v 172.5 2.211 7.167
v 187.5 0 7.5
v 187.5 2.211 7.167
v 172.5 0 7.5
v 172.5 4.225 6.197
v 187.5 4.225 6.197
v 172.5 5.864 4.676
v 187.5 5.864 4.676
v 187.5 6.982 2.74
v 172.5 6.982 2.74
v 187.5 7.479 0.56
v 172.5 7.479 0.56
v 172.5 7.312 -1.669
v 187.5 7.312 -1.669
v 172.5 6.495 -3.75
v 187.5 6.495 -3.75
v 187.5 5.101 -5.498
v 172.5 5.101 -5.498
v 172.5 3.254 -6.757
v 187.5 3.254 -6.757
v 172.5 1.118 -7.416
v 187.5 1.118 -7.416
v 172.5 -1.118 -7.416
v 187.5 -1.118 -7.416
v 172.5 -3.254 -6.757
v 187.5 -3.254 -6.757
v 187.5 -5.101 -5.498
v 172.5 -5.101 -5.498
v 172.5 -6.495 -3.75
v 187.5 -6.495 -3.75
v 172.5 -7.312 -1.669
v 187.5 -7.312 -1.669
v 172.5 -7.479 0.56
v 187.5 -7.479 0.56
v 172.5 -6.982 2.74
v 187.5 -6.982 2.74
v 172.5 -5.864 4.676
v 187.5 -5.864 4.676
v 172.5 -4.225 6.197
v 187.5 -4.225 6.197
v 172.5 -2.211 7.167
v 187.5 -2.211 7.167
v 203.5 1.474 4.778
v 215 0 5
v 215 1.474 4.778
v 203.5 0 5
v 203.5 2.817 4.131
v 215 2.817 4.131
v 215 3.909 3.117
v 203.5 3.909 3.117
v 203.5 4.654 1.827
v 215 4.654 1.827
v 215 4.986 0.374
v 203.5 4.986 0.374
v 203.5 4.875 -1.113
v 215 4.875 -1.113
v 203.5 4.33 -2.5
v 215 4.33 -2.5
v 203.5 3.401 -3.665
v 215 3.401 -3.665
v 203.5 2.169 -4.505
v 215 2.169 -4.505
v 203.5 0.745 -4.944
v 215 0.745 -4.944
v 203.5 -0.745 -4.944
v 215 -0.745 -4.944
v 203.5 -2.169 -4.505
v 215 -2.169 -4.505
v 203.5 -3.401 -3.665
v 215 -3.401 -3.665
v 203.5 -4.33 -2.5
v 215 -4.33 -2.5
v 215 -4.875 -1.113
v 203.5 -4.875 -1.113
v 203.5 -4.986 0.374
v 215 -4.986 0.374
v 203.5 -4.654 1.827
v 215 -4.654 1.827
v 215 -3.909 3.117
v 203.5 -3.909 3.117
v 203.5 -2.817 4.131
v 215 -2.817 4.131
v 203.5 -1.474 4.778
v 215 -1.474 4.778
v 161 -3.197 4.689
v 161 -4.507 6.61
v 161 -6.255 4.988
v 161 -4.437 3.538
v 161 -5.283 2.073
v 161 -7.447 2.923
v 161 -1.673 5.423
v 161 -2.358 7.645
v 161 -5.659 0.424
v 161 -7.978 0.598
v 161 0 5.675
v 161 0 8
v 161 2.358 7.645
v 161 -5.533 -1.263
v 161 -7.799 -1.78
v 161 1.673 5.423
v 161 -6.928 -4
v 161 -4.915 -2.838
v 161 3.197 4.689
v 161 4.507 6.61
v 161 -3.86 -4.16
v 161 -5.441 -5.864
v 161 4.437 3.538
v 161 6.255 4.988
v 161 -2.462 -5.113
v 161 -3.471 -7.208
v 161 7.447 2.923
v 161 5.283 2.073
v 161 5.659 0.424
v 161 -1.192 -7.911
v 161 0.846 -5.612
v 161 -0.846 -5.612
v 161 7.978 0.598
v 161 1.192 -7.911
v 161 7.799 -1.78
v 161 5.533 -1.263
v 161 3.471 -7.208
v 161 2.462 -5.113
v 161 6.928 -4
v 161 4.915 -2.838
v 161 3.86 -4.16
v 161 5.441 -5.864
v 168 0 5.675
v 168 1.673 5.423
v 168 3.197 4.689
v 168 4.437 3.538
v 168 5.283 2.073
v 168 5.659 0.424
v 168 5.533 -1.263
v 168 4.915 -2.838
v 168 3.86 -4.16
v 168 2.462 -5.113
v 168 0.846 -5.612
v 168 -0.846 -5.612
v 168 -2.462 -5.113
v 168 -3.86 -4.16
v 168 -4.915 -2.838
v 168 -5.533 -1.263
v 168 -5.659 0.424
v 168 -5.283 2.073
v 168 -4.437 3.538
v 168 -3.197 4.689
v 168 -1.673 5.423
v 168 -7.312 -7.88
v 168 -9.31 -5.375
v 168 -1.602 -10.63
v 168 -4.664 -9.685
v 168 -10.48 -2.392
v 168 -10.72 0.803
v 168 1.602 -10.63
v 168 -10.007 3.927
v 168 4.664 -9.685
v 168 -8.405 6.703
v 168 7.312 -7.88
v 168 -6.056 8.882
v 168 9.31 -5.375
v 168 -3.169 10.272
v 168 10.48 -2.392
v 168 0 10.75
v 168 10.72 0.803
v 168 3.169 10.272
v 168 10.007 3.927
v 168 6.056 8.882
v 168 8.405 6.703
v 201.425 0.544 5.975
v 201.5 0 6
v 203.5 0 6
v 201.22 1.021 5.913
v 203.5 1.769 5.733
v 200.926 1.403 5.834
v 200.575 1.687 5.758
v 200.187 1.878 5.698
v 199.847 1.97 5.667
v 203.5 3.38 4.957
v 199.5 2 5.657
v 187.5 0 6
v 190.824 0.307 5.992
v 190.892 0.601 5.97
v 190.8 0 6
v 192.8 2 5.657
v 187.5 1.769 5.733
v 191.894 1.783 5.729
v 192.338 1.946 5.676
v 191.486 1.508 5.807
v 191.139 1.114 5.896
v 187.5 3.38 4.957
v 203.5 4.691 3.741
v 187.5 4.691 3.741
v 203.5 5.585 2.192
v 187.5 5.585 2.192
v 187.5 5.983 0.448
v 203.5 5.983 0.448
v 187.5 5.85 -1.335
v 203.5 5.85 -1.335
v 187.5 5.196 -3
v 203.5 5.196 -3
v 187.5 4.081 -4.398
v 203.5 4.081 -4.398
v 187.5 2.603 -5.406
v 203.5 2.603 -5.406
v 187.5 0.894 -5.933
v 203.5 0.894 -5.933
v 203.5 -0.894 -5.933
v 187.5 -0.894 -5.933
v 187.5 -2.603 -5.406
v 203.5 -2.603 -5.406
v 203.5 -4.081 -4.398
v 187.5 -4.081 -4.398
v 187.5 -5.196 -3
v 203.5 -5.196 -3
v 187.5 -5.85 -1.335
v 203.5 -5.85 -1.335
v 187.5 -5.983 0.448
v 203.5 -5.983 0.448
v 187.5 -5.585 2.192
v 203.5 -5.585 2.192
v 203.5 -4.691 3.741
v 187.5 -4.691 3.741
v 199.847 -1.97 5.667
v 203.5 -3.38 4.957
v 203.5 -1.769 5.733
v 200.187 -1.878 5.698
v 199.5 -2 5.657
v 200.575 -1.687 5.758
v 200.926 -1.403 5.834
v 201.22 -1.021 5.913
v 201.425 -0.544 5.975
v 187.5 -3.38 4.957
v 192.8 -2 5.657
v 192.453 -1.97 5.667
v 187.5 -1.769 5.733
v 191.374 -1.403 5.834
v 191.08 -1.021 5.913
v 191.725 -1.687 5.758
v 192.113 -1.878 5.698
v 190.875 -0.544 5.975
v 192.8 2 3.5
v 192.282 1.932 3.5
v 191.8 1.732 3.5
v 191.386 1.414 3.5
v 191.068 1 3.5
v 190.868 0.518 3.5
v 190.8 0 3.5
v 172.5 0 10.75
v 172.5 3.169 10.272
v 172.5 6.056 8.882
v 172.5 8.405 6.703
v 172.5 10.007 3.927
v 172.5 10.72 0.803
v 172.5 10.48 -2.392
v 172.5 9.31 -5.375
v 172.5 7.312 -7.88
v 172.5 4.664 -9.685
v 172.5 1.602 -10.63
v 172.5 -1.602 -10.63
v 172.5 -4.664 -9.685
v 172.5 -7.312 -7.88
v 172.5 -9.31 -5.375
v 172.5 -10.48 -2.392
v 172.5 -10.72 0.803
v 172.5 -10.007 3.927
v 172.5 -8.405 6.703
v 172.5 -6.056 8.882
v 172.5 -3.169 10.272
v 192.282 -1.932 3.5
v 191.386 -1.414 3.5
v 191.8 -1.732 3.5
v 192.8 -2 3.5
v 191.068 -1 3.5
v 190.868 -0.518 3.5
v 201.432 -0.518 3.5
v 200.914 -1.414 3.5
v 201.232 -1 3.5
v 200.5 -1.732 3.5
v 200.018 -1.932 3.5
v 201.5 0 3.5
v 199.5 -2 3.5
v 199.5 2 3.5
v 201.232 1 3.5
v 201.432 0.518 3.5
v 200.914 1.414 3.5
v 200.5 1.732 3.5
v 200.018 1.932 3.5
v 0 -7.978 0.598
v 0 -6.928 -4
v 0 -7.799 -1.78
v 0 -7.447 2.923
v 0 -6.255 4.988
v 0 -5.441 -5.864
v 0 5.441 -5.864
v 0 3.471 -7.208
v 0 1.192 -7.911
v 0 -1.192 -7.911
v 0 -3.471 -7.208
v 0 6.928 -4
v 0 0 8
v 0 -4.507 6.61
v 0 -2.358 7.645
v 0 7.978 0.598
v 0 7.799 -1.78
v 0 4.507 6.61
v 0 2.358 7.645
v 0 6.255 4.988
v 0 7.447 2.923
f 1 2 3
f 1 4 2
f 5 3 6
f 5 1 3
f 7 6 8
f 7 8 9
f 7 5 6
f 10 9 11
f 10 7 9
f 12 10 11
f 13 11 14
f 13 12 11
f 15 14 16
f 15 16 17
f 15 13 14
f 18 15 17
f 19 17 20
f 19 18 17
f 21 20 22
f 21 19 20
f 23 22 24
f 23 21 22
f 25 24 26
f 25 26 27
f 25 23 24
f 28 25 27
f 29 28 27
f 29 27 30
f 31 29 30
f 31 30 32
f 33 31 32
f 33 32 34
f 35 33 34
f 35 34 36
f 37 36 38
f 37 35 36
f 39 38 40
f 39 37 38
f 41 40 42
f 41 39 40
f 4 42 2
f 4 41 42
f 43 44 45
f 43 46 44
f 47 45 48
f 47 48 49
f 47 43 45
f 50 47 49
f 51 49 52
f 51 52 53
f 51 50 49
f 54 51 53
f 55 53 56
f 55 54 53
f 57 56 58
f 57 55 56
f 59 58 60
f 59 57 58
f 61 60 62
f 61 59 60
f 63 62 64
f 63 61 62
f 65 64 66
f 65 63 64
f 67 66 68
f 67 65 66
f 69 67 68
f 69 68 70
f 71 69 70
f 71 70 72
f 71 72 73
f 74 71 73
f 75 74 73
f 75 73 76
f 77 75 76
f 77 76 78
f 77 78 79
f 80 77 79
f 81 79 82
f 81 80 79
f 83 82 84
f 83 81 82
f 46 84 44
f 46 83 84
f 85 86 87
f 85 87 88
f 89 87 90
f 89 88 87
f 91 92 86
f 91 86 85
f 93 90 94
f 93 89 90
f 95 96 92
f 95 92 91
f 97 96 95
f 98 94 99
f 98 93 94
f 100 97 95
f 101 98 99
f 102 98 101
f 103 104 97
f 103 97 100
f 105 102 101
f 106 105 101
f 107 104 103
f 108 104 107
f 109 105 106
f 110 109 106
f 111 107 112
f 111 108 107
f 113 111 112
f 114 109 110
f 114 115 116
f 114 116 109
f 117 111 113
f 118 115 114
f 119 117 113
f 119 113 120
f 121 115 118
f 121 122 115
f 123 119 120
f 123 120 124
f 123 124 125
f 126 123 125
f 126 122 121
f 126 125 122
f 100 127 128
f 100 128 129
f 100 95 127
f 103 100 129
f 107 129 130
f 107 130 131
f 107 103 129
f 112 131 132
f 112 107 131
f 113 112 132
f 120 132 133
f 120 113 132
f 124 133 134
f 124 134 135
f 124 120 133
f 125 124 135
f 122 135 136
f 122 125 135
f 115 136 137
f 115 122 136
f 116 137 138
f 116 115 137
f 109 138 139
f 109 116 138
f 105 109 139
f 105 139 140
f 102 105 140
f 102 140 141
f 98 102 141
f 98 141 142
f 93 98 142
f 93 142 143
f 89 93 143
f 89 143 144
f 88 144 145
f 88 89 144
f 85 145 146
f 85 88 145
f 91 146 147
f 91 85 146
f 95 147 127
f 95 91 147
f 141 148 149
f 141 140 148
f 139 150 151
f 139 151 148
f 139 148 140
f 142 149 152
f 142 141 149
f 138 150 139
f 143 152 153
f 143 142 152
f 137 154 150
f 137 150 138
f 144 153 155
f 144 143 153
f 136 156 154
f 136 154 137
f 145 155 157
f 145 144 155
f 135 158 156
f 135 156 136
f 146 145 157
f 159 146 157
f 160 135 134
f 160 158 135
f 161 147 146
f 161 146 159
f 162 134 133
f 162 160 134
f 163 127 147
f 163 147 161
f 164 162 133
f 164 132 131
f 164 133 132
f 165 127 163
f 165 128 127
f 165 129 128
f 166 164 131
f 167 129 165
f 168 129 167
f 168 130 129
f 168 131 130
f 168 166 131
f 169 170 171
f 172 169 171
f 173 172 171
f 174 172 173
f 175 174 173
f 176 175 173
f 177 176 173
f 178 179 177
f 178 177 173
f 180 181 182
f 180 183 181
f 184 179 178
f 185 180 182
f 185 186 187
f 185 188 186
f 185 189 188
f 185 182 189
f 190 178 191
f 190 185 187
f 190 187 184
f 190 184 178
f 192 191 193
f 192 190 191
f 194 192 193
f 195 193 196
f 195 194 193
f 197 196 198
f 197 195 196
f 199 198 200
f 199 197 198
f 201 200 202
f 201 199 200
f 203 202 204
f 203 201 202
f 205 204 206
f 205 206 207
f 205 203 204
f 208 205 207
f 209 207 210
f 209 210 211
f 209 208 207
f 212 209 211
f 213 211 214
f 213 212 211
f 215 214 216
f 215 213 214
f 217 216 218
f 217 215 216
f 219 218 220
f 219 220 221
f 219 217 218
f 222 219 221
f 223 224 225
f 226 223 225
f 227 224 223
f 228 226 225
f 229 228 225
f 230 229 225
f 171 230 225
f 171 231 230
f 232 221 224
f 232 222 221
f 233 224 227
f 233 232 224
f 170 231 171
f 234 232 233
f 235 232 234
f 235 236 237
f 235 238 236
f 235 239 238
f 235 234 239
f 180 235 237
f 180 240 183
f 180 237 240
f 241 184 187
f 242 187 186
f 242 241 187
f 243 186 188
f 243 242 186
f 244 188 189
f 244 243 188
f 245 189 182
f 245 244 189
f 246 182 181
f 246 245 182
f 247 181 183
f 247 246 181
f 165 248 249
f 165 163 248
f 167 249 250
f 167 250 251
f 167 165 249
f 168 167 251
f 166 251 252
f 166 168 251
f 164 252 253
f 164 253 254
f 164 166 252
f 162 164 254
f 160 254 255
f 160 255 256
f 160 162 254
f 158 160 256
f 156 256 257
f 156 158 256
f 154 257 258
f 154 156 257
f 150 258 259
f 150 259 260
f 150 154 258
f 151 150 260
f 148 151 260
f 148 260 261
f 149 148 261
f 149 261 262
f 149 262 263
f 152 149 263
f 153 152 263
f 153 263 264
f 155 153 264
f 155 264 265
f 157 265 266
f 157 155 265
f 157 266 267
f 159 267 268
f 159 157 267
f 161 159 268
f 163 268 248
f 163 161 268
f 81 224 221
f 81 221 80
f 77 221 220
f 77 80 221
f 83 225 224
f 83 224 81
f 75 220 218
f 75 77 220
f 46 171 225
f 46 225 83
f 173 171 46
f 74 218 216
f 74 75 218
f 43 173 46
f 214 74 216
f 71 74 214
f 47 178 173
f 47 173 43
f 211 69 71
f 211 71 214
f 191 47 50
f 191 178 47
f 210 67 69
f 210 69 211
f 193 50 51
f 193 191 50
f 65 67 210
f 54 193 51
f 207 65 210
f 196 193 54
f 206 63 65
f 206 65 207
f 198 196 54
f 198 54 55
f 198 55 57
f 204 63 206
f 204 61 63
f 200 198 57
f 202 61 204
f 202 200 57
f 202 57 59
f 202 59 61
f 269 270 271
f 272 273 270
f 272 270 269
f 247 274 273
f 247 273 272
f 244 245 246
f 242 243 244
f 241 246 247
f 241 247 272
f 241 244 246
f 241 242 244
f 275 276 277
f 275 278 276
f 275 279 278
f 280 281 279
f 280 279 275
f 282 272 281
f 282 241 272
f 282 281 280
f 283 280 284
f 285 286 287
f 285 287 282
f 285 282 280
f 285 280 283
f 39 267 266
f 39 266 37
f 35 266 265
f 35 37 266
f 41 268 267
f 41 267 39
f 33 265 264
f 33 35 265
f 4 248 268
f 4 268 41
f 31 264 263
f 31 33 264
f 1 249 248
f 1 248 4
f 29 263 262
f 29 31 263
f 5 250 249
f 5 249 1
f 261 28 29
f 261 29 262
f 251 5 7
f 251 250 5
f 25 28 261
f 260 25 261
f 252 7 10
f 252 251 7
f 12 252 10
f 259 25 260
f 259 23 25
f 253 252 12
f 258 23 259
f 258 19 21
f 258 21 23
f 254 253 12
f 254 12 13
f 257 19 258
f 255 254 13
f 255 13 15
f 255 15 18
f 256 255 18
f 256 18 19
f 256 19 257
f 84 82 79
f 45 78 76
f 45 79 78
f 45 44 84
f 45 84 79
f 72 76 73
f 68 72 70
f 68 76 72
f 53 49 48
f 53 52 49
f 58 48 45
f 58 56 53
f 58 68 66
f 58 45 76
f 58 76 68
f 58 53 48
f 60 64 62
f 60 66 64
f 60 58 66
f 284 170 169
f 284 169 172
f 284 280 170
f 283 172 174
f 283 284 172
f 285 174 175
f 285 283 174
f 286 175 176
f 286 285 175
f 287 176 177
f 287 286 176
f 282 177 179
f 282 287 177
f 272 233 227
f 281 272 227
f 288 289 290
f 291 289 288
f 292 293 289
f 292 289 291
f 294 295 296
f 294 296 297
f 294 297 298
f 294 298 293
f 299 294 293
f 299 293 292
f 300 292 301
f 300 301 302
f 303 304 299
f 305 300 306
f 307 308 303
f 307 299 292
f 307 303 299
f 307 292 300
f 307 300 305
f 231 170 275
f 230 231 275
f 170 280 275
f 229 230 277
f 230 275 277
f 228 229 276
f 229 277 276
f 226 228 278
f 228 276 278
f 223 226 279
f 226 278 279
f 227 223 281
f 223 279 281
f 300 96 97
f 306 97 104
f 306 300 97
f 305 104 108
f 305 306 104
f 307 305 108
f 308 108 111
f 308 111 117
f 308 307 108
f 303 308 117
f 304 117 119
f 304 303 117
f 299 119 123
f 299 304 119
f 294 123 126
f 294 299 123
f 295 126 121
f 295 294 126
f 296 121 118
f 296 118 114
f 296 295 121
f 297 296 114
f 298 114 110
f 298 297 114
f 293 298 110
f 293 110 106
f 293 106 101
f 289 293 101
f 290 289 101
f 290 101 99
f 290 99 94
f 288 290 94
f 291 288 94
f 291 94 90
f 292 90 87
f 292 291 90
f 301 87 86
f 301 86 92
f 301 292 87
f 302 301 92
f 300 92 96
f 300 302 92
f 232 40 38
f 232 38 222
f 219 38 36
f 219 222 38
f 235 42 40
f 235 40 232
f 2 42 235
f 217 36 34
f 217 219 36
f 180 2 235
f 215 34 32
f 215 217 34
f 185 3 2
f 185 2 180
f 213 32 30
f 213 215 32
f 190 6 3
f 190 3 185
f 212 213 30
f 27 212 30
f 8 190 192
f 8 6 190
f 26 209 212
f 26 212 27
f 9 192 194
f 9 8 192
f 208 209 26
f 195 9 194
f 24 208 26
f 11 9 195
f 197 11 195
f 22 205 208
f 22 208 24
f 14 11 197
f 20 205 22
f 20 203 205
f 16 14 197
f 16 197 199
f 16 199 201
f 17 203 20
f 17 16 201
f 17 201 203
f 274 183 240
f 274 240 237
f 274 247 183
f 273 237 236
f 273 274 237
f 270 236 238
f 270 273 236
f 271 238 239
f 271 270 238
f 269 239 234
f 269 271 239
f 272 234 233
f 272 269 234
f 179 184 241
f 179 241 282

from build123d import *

# Parameters (mm, degrees)
F3_W     = 10.7
F3_H     = 4
F4_DEPTH = 4
F5_R     = 1.99999


# Not quite as in the source:
# - a fillet or chamfer is up to 0.001 mm smaller than in the source, because OpenCascade refuses the exact size


with BuildPart() as f1:
    # F0 (on Front) → F1 (revolve)
    with BuildSketch(Plane.XZ):
        Polygon((0, 8), (0, 0), (215, 0), (215, 5), (203.5, 5), (203.5, 6), (187.5, 6), (187.5, 7.5), (172.5, 7.5), (172.5, 10.75), (168, 10.75), (168, 5.675), (161, 5.675), (161, 8), align=None)
    revolve(axis=Axis((-30.1147408886, 0, 0), (-1, 0, 0)))

    # F3 (on offset) → F4 (cut)
    with BuildSketch(Plane.XY.offset(7.5)):
        with Locations((196.15, 0)):
            Rectangle(F3_W, F3_H)
    extrude(amount=-F4_DEPTH, mode=Mode.SUBTRACT)

    # F5 (radius 2 in the source; OpenCascade refuses exactly that, so slightly less here)
    f5_edges = [f1.edges().sort_by_distance(p)[0] for p in [
        (190.8, 2, 4.578427),
        (201.5, 2, 4.578427),
        (201.5, -2, 4.578427),
        (190.8, -2, 4.578427),
    ]]
    fillet(f5_edges, radius=F5_R)


solid = f1.part
